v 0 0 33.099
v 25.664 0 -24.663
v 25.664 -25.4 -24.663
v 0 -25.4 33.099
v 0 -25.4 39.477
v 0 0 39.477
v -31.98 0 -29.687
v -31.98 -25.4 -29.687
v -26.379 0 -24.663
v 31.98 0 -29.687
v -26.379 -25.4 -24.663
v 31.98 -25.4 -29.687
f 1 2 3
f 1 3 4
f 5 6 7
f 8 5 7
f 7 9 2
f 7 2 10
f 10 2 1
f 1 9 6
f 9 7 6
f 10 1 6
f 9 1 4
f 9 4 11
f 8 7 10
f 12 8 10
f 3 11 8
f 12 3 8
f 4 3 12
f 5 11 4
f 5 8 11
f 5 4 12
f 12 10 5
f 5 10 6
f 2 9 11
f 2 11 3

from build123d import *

# Parameters (mm, degrees)
F1_DEPTH = 25.4
F3_DEPTH = 50.8


with BuildPart() as f1:
    # F0 (on Front) → F1 (new body)
    with BuildSketch(Plane.XZ):
        Polygon((31.980053, -29.687206), (0, 39.477208), (-31.980053, -29.687206), align=None)
    extrude(amount=F1_DEPTH)

    # F2 (on Front) → F3 (cut)
    with BuildSketch(Plane.XZ):
        Polygon((25.663907, -24.663087), (0, 33.098578), (-26.37878, -24.663087), align=None)
    extrude(amount=F3_DEPTH, mode=Mode.SUBTRACT)


solid = f1.part
